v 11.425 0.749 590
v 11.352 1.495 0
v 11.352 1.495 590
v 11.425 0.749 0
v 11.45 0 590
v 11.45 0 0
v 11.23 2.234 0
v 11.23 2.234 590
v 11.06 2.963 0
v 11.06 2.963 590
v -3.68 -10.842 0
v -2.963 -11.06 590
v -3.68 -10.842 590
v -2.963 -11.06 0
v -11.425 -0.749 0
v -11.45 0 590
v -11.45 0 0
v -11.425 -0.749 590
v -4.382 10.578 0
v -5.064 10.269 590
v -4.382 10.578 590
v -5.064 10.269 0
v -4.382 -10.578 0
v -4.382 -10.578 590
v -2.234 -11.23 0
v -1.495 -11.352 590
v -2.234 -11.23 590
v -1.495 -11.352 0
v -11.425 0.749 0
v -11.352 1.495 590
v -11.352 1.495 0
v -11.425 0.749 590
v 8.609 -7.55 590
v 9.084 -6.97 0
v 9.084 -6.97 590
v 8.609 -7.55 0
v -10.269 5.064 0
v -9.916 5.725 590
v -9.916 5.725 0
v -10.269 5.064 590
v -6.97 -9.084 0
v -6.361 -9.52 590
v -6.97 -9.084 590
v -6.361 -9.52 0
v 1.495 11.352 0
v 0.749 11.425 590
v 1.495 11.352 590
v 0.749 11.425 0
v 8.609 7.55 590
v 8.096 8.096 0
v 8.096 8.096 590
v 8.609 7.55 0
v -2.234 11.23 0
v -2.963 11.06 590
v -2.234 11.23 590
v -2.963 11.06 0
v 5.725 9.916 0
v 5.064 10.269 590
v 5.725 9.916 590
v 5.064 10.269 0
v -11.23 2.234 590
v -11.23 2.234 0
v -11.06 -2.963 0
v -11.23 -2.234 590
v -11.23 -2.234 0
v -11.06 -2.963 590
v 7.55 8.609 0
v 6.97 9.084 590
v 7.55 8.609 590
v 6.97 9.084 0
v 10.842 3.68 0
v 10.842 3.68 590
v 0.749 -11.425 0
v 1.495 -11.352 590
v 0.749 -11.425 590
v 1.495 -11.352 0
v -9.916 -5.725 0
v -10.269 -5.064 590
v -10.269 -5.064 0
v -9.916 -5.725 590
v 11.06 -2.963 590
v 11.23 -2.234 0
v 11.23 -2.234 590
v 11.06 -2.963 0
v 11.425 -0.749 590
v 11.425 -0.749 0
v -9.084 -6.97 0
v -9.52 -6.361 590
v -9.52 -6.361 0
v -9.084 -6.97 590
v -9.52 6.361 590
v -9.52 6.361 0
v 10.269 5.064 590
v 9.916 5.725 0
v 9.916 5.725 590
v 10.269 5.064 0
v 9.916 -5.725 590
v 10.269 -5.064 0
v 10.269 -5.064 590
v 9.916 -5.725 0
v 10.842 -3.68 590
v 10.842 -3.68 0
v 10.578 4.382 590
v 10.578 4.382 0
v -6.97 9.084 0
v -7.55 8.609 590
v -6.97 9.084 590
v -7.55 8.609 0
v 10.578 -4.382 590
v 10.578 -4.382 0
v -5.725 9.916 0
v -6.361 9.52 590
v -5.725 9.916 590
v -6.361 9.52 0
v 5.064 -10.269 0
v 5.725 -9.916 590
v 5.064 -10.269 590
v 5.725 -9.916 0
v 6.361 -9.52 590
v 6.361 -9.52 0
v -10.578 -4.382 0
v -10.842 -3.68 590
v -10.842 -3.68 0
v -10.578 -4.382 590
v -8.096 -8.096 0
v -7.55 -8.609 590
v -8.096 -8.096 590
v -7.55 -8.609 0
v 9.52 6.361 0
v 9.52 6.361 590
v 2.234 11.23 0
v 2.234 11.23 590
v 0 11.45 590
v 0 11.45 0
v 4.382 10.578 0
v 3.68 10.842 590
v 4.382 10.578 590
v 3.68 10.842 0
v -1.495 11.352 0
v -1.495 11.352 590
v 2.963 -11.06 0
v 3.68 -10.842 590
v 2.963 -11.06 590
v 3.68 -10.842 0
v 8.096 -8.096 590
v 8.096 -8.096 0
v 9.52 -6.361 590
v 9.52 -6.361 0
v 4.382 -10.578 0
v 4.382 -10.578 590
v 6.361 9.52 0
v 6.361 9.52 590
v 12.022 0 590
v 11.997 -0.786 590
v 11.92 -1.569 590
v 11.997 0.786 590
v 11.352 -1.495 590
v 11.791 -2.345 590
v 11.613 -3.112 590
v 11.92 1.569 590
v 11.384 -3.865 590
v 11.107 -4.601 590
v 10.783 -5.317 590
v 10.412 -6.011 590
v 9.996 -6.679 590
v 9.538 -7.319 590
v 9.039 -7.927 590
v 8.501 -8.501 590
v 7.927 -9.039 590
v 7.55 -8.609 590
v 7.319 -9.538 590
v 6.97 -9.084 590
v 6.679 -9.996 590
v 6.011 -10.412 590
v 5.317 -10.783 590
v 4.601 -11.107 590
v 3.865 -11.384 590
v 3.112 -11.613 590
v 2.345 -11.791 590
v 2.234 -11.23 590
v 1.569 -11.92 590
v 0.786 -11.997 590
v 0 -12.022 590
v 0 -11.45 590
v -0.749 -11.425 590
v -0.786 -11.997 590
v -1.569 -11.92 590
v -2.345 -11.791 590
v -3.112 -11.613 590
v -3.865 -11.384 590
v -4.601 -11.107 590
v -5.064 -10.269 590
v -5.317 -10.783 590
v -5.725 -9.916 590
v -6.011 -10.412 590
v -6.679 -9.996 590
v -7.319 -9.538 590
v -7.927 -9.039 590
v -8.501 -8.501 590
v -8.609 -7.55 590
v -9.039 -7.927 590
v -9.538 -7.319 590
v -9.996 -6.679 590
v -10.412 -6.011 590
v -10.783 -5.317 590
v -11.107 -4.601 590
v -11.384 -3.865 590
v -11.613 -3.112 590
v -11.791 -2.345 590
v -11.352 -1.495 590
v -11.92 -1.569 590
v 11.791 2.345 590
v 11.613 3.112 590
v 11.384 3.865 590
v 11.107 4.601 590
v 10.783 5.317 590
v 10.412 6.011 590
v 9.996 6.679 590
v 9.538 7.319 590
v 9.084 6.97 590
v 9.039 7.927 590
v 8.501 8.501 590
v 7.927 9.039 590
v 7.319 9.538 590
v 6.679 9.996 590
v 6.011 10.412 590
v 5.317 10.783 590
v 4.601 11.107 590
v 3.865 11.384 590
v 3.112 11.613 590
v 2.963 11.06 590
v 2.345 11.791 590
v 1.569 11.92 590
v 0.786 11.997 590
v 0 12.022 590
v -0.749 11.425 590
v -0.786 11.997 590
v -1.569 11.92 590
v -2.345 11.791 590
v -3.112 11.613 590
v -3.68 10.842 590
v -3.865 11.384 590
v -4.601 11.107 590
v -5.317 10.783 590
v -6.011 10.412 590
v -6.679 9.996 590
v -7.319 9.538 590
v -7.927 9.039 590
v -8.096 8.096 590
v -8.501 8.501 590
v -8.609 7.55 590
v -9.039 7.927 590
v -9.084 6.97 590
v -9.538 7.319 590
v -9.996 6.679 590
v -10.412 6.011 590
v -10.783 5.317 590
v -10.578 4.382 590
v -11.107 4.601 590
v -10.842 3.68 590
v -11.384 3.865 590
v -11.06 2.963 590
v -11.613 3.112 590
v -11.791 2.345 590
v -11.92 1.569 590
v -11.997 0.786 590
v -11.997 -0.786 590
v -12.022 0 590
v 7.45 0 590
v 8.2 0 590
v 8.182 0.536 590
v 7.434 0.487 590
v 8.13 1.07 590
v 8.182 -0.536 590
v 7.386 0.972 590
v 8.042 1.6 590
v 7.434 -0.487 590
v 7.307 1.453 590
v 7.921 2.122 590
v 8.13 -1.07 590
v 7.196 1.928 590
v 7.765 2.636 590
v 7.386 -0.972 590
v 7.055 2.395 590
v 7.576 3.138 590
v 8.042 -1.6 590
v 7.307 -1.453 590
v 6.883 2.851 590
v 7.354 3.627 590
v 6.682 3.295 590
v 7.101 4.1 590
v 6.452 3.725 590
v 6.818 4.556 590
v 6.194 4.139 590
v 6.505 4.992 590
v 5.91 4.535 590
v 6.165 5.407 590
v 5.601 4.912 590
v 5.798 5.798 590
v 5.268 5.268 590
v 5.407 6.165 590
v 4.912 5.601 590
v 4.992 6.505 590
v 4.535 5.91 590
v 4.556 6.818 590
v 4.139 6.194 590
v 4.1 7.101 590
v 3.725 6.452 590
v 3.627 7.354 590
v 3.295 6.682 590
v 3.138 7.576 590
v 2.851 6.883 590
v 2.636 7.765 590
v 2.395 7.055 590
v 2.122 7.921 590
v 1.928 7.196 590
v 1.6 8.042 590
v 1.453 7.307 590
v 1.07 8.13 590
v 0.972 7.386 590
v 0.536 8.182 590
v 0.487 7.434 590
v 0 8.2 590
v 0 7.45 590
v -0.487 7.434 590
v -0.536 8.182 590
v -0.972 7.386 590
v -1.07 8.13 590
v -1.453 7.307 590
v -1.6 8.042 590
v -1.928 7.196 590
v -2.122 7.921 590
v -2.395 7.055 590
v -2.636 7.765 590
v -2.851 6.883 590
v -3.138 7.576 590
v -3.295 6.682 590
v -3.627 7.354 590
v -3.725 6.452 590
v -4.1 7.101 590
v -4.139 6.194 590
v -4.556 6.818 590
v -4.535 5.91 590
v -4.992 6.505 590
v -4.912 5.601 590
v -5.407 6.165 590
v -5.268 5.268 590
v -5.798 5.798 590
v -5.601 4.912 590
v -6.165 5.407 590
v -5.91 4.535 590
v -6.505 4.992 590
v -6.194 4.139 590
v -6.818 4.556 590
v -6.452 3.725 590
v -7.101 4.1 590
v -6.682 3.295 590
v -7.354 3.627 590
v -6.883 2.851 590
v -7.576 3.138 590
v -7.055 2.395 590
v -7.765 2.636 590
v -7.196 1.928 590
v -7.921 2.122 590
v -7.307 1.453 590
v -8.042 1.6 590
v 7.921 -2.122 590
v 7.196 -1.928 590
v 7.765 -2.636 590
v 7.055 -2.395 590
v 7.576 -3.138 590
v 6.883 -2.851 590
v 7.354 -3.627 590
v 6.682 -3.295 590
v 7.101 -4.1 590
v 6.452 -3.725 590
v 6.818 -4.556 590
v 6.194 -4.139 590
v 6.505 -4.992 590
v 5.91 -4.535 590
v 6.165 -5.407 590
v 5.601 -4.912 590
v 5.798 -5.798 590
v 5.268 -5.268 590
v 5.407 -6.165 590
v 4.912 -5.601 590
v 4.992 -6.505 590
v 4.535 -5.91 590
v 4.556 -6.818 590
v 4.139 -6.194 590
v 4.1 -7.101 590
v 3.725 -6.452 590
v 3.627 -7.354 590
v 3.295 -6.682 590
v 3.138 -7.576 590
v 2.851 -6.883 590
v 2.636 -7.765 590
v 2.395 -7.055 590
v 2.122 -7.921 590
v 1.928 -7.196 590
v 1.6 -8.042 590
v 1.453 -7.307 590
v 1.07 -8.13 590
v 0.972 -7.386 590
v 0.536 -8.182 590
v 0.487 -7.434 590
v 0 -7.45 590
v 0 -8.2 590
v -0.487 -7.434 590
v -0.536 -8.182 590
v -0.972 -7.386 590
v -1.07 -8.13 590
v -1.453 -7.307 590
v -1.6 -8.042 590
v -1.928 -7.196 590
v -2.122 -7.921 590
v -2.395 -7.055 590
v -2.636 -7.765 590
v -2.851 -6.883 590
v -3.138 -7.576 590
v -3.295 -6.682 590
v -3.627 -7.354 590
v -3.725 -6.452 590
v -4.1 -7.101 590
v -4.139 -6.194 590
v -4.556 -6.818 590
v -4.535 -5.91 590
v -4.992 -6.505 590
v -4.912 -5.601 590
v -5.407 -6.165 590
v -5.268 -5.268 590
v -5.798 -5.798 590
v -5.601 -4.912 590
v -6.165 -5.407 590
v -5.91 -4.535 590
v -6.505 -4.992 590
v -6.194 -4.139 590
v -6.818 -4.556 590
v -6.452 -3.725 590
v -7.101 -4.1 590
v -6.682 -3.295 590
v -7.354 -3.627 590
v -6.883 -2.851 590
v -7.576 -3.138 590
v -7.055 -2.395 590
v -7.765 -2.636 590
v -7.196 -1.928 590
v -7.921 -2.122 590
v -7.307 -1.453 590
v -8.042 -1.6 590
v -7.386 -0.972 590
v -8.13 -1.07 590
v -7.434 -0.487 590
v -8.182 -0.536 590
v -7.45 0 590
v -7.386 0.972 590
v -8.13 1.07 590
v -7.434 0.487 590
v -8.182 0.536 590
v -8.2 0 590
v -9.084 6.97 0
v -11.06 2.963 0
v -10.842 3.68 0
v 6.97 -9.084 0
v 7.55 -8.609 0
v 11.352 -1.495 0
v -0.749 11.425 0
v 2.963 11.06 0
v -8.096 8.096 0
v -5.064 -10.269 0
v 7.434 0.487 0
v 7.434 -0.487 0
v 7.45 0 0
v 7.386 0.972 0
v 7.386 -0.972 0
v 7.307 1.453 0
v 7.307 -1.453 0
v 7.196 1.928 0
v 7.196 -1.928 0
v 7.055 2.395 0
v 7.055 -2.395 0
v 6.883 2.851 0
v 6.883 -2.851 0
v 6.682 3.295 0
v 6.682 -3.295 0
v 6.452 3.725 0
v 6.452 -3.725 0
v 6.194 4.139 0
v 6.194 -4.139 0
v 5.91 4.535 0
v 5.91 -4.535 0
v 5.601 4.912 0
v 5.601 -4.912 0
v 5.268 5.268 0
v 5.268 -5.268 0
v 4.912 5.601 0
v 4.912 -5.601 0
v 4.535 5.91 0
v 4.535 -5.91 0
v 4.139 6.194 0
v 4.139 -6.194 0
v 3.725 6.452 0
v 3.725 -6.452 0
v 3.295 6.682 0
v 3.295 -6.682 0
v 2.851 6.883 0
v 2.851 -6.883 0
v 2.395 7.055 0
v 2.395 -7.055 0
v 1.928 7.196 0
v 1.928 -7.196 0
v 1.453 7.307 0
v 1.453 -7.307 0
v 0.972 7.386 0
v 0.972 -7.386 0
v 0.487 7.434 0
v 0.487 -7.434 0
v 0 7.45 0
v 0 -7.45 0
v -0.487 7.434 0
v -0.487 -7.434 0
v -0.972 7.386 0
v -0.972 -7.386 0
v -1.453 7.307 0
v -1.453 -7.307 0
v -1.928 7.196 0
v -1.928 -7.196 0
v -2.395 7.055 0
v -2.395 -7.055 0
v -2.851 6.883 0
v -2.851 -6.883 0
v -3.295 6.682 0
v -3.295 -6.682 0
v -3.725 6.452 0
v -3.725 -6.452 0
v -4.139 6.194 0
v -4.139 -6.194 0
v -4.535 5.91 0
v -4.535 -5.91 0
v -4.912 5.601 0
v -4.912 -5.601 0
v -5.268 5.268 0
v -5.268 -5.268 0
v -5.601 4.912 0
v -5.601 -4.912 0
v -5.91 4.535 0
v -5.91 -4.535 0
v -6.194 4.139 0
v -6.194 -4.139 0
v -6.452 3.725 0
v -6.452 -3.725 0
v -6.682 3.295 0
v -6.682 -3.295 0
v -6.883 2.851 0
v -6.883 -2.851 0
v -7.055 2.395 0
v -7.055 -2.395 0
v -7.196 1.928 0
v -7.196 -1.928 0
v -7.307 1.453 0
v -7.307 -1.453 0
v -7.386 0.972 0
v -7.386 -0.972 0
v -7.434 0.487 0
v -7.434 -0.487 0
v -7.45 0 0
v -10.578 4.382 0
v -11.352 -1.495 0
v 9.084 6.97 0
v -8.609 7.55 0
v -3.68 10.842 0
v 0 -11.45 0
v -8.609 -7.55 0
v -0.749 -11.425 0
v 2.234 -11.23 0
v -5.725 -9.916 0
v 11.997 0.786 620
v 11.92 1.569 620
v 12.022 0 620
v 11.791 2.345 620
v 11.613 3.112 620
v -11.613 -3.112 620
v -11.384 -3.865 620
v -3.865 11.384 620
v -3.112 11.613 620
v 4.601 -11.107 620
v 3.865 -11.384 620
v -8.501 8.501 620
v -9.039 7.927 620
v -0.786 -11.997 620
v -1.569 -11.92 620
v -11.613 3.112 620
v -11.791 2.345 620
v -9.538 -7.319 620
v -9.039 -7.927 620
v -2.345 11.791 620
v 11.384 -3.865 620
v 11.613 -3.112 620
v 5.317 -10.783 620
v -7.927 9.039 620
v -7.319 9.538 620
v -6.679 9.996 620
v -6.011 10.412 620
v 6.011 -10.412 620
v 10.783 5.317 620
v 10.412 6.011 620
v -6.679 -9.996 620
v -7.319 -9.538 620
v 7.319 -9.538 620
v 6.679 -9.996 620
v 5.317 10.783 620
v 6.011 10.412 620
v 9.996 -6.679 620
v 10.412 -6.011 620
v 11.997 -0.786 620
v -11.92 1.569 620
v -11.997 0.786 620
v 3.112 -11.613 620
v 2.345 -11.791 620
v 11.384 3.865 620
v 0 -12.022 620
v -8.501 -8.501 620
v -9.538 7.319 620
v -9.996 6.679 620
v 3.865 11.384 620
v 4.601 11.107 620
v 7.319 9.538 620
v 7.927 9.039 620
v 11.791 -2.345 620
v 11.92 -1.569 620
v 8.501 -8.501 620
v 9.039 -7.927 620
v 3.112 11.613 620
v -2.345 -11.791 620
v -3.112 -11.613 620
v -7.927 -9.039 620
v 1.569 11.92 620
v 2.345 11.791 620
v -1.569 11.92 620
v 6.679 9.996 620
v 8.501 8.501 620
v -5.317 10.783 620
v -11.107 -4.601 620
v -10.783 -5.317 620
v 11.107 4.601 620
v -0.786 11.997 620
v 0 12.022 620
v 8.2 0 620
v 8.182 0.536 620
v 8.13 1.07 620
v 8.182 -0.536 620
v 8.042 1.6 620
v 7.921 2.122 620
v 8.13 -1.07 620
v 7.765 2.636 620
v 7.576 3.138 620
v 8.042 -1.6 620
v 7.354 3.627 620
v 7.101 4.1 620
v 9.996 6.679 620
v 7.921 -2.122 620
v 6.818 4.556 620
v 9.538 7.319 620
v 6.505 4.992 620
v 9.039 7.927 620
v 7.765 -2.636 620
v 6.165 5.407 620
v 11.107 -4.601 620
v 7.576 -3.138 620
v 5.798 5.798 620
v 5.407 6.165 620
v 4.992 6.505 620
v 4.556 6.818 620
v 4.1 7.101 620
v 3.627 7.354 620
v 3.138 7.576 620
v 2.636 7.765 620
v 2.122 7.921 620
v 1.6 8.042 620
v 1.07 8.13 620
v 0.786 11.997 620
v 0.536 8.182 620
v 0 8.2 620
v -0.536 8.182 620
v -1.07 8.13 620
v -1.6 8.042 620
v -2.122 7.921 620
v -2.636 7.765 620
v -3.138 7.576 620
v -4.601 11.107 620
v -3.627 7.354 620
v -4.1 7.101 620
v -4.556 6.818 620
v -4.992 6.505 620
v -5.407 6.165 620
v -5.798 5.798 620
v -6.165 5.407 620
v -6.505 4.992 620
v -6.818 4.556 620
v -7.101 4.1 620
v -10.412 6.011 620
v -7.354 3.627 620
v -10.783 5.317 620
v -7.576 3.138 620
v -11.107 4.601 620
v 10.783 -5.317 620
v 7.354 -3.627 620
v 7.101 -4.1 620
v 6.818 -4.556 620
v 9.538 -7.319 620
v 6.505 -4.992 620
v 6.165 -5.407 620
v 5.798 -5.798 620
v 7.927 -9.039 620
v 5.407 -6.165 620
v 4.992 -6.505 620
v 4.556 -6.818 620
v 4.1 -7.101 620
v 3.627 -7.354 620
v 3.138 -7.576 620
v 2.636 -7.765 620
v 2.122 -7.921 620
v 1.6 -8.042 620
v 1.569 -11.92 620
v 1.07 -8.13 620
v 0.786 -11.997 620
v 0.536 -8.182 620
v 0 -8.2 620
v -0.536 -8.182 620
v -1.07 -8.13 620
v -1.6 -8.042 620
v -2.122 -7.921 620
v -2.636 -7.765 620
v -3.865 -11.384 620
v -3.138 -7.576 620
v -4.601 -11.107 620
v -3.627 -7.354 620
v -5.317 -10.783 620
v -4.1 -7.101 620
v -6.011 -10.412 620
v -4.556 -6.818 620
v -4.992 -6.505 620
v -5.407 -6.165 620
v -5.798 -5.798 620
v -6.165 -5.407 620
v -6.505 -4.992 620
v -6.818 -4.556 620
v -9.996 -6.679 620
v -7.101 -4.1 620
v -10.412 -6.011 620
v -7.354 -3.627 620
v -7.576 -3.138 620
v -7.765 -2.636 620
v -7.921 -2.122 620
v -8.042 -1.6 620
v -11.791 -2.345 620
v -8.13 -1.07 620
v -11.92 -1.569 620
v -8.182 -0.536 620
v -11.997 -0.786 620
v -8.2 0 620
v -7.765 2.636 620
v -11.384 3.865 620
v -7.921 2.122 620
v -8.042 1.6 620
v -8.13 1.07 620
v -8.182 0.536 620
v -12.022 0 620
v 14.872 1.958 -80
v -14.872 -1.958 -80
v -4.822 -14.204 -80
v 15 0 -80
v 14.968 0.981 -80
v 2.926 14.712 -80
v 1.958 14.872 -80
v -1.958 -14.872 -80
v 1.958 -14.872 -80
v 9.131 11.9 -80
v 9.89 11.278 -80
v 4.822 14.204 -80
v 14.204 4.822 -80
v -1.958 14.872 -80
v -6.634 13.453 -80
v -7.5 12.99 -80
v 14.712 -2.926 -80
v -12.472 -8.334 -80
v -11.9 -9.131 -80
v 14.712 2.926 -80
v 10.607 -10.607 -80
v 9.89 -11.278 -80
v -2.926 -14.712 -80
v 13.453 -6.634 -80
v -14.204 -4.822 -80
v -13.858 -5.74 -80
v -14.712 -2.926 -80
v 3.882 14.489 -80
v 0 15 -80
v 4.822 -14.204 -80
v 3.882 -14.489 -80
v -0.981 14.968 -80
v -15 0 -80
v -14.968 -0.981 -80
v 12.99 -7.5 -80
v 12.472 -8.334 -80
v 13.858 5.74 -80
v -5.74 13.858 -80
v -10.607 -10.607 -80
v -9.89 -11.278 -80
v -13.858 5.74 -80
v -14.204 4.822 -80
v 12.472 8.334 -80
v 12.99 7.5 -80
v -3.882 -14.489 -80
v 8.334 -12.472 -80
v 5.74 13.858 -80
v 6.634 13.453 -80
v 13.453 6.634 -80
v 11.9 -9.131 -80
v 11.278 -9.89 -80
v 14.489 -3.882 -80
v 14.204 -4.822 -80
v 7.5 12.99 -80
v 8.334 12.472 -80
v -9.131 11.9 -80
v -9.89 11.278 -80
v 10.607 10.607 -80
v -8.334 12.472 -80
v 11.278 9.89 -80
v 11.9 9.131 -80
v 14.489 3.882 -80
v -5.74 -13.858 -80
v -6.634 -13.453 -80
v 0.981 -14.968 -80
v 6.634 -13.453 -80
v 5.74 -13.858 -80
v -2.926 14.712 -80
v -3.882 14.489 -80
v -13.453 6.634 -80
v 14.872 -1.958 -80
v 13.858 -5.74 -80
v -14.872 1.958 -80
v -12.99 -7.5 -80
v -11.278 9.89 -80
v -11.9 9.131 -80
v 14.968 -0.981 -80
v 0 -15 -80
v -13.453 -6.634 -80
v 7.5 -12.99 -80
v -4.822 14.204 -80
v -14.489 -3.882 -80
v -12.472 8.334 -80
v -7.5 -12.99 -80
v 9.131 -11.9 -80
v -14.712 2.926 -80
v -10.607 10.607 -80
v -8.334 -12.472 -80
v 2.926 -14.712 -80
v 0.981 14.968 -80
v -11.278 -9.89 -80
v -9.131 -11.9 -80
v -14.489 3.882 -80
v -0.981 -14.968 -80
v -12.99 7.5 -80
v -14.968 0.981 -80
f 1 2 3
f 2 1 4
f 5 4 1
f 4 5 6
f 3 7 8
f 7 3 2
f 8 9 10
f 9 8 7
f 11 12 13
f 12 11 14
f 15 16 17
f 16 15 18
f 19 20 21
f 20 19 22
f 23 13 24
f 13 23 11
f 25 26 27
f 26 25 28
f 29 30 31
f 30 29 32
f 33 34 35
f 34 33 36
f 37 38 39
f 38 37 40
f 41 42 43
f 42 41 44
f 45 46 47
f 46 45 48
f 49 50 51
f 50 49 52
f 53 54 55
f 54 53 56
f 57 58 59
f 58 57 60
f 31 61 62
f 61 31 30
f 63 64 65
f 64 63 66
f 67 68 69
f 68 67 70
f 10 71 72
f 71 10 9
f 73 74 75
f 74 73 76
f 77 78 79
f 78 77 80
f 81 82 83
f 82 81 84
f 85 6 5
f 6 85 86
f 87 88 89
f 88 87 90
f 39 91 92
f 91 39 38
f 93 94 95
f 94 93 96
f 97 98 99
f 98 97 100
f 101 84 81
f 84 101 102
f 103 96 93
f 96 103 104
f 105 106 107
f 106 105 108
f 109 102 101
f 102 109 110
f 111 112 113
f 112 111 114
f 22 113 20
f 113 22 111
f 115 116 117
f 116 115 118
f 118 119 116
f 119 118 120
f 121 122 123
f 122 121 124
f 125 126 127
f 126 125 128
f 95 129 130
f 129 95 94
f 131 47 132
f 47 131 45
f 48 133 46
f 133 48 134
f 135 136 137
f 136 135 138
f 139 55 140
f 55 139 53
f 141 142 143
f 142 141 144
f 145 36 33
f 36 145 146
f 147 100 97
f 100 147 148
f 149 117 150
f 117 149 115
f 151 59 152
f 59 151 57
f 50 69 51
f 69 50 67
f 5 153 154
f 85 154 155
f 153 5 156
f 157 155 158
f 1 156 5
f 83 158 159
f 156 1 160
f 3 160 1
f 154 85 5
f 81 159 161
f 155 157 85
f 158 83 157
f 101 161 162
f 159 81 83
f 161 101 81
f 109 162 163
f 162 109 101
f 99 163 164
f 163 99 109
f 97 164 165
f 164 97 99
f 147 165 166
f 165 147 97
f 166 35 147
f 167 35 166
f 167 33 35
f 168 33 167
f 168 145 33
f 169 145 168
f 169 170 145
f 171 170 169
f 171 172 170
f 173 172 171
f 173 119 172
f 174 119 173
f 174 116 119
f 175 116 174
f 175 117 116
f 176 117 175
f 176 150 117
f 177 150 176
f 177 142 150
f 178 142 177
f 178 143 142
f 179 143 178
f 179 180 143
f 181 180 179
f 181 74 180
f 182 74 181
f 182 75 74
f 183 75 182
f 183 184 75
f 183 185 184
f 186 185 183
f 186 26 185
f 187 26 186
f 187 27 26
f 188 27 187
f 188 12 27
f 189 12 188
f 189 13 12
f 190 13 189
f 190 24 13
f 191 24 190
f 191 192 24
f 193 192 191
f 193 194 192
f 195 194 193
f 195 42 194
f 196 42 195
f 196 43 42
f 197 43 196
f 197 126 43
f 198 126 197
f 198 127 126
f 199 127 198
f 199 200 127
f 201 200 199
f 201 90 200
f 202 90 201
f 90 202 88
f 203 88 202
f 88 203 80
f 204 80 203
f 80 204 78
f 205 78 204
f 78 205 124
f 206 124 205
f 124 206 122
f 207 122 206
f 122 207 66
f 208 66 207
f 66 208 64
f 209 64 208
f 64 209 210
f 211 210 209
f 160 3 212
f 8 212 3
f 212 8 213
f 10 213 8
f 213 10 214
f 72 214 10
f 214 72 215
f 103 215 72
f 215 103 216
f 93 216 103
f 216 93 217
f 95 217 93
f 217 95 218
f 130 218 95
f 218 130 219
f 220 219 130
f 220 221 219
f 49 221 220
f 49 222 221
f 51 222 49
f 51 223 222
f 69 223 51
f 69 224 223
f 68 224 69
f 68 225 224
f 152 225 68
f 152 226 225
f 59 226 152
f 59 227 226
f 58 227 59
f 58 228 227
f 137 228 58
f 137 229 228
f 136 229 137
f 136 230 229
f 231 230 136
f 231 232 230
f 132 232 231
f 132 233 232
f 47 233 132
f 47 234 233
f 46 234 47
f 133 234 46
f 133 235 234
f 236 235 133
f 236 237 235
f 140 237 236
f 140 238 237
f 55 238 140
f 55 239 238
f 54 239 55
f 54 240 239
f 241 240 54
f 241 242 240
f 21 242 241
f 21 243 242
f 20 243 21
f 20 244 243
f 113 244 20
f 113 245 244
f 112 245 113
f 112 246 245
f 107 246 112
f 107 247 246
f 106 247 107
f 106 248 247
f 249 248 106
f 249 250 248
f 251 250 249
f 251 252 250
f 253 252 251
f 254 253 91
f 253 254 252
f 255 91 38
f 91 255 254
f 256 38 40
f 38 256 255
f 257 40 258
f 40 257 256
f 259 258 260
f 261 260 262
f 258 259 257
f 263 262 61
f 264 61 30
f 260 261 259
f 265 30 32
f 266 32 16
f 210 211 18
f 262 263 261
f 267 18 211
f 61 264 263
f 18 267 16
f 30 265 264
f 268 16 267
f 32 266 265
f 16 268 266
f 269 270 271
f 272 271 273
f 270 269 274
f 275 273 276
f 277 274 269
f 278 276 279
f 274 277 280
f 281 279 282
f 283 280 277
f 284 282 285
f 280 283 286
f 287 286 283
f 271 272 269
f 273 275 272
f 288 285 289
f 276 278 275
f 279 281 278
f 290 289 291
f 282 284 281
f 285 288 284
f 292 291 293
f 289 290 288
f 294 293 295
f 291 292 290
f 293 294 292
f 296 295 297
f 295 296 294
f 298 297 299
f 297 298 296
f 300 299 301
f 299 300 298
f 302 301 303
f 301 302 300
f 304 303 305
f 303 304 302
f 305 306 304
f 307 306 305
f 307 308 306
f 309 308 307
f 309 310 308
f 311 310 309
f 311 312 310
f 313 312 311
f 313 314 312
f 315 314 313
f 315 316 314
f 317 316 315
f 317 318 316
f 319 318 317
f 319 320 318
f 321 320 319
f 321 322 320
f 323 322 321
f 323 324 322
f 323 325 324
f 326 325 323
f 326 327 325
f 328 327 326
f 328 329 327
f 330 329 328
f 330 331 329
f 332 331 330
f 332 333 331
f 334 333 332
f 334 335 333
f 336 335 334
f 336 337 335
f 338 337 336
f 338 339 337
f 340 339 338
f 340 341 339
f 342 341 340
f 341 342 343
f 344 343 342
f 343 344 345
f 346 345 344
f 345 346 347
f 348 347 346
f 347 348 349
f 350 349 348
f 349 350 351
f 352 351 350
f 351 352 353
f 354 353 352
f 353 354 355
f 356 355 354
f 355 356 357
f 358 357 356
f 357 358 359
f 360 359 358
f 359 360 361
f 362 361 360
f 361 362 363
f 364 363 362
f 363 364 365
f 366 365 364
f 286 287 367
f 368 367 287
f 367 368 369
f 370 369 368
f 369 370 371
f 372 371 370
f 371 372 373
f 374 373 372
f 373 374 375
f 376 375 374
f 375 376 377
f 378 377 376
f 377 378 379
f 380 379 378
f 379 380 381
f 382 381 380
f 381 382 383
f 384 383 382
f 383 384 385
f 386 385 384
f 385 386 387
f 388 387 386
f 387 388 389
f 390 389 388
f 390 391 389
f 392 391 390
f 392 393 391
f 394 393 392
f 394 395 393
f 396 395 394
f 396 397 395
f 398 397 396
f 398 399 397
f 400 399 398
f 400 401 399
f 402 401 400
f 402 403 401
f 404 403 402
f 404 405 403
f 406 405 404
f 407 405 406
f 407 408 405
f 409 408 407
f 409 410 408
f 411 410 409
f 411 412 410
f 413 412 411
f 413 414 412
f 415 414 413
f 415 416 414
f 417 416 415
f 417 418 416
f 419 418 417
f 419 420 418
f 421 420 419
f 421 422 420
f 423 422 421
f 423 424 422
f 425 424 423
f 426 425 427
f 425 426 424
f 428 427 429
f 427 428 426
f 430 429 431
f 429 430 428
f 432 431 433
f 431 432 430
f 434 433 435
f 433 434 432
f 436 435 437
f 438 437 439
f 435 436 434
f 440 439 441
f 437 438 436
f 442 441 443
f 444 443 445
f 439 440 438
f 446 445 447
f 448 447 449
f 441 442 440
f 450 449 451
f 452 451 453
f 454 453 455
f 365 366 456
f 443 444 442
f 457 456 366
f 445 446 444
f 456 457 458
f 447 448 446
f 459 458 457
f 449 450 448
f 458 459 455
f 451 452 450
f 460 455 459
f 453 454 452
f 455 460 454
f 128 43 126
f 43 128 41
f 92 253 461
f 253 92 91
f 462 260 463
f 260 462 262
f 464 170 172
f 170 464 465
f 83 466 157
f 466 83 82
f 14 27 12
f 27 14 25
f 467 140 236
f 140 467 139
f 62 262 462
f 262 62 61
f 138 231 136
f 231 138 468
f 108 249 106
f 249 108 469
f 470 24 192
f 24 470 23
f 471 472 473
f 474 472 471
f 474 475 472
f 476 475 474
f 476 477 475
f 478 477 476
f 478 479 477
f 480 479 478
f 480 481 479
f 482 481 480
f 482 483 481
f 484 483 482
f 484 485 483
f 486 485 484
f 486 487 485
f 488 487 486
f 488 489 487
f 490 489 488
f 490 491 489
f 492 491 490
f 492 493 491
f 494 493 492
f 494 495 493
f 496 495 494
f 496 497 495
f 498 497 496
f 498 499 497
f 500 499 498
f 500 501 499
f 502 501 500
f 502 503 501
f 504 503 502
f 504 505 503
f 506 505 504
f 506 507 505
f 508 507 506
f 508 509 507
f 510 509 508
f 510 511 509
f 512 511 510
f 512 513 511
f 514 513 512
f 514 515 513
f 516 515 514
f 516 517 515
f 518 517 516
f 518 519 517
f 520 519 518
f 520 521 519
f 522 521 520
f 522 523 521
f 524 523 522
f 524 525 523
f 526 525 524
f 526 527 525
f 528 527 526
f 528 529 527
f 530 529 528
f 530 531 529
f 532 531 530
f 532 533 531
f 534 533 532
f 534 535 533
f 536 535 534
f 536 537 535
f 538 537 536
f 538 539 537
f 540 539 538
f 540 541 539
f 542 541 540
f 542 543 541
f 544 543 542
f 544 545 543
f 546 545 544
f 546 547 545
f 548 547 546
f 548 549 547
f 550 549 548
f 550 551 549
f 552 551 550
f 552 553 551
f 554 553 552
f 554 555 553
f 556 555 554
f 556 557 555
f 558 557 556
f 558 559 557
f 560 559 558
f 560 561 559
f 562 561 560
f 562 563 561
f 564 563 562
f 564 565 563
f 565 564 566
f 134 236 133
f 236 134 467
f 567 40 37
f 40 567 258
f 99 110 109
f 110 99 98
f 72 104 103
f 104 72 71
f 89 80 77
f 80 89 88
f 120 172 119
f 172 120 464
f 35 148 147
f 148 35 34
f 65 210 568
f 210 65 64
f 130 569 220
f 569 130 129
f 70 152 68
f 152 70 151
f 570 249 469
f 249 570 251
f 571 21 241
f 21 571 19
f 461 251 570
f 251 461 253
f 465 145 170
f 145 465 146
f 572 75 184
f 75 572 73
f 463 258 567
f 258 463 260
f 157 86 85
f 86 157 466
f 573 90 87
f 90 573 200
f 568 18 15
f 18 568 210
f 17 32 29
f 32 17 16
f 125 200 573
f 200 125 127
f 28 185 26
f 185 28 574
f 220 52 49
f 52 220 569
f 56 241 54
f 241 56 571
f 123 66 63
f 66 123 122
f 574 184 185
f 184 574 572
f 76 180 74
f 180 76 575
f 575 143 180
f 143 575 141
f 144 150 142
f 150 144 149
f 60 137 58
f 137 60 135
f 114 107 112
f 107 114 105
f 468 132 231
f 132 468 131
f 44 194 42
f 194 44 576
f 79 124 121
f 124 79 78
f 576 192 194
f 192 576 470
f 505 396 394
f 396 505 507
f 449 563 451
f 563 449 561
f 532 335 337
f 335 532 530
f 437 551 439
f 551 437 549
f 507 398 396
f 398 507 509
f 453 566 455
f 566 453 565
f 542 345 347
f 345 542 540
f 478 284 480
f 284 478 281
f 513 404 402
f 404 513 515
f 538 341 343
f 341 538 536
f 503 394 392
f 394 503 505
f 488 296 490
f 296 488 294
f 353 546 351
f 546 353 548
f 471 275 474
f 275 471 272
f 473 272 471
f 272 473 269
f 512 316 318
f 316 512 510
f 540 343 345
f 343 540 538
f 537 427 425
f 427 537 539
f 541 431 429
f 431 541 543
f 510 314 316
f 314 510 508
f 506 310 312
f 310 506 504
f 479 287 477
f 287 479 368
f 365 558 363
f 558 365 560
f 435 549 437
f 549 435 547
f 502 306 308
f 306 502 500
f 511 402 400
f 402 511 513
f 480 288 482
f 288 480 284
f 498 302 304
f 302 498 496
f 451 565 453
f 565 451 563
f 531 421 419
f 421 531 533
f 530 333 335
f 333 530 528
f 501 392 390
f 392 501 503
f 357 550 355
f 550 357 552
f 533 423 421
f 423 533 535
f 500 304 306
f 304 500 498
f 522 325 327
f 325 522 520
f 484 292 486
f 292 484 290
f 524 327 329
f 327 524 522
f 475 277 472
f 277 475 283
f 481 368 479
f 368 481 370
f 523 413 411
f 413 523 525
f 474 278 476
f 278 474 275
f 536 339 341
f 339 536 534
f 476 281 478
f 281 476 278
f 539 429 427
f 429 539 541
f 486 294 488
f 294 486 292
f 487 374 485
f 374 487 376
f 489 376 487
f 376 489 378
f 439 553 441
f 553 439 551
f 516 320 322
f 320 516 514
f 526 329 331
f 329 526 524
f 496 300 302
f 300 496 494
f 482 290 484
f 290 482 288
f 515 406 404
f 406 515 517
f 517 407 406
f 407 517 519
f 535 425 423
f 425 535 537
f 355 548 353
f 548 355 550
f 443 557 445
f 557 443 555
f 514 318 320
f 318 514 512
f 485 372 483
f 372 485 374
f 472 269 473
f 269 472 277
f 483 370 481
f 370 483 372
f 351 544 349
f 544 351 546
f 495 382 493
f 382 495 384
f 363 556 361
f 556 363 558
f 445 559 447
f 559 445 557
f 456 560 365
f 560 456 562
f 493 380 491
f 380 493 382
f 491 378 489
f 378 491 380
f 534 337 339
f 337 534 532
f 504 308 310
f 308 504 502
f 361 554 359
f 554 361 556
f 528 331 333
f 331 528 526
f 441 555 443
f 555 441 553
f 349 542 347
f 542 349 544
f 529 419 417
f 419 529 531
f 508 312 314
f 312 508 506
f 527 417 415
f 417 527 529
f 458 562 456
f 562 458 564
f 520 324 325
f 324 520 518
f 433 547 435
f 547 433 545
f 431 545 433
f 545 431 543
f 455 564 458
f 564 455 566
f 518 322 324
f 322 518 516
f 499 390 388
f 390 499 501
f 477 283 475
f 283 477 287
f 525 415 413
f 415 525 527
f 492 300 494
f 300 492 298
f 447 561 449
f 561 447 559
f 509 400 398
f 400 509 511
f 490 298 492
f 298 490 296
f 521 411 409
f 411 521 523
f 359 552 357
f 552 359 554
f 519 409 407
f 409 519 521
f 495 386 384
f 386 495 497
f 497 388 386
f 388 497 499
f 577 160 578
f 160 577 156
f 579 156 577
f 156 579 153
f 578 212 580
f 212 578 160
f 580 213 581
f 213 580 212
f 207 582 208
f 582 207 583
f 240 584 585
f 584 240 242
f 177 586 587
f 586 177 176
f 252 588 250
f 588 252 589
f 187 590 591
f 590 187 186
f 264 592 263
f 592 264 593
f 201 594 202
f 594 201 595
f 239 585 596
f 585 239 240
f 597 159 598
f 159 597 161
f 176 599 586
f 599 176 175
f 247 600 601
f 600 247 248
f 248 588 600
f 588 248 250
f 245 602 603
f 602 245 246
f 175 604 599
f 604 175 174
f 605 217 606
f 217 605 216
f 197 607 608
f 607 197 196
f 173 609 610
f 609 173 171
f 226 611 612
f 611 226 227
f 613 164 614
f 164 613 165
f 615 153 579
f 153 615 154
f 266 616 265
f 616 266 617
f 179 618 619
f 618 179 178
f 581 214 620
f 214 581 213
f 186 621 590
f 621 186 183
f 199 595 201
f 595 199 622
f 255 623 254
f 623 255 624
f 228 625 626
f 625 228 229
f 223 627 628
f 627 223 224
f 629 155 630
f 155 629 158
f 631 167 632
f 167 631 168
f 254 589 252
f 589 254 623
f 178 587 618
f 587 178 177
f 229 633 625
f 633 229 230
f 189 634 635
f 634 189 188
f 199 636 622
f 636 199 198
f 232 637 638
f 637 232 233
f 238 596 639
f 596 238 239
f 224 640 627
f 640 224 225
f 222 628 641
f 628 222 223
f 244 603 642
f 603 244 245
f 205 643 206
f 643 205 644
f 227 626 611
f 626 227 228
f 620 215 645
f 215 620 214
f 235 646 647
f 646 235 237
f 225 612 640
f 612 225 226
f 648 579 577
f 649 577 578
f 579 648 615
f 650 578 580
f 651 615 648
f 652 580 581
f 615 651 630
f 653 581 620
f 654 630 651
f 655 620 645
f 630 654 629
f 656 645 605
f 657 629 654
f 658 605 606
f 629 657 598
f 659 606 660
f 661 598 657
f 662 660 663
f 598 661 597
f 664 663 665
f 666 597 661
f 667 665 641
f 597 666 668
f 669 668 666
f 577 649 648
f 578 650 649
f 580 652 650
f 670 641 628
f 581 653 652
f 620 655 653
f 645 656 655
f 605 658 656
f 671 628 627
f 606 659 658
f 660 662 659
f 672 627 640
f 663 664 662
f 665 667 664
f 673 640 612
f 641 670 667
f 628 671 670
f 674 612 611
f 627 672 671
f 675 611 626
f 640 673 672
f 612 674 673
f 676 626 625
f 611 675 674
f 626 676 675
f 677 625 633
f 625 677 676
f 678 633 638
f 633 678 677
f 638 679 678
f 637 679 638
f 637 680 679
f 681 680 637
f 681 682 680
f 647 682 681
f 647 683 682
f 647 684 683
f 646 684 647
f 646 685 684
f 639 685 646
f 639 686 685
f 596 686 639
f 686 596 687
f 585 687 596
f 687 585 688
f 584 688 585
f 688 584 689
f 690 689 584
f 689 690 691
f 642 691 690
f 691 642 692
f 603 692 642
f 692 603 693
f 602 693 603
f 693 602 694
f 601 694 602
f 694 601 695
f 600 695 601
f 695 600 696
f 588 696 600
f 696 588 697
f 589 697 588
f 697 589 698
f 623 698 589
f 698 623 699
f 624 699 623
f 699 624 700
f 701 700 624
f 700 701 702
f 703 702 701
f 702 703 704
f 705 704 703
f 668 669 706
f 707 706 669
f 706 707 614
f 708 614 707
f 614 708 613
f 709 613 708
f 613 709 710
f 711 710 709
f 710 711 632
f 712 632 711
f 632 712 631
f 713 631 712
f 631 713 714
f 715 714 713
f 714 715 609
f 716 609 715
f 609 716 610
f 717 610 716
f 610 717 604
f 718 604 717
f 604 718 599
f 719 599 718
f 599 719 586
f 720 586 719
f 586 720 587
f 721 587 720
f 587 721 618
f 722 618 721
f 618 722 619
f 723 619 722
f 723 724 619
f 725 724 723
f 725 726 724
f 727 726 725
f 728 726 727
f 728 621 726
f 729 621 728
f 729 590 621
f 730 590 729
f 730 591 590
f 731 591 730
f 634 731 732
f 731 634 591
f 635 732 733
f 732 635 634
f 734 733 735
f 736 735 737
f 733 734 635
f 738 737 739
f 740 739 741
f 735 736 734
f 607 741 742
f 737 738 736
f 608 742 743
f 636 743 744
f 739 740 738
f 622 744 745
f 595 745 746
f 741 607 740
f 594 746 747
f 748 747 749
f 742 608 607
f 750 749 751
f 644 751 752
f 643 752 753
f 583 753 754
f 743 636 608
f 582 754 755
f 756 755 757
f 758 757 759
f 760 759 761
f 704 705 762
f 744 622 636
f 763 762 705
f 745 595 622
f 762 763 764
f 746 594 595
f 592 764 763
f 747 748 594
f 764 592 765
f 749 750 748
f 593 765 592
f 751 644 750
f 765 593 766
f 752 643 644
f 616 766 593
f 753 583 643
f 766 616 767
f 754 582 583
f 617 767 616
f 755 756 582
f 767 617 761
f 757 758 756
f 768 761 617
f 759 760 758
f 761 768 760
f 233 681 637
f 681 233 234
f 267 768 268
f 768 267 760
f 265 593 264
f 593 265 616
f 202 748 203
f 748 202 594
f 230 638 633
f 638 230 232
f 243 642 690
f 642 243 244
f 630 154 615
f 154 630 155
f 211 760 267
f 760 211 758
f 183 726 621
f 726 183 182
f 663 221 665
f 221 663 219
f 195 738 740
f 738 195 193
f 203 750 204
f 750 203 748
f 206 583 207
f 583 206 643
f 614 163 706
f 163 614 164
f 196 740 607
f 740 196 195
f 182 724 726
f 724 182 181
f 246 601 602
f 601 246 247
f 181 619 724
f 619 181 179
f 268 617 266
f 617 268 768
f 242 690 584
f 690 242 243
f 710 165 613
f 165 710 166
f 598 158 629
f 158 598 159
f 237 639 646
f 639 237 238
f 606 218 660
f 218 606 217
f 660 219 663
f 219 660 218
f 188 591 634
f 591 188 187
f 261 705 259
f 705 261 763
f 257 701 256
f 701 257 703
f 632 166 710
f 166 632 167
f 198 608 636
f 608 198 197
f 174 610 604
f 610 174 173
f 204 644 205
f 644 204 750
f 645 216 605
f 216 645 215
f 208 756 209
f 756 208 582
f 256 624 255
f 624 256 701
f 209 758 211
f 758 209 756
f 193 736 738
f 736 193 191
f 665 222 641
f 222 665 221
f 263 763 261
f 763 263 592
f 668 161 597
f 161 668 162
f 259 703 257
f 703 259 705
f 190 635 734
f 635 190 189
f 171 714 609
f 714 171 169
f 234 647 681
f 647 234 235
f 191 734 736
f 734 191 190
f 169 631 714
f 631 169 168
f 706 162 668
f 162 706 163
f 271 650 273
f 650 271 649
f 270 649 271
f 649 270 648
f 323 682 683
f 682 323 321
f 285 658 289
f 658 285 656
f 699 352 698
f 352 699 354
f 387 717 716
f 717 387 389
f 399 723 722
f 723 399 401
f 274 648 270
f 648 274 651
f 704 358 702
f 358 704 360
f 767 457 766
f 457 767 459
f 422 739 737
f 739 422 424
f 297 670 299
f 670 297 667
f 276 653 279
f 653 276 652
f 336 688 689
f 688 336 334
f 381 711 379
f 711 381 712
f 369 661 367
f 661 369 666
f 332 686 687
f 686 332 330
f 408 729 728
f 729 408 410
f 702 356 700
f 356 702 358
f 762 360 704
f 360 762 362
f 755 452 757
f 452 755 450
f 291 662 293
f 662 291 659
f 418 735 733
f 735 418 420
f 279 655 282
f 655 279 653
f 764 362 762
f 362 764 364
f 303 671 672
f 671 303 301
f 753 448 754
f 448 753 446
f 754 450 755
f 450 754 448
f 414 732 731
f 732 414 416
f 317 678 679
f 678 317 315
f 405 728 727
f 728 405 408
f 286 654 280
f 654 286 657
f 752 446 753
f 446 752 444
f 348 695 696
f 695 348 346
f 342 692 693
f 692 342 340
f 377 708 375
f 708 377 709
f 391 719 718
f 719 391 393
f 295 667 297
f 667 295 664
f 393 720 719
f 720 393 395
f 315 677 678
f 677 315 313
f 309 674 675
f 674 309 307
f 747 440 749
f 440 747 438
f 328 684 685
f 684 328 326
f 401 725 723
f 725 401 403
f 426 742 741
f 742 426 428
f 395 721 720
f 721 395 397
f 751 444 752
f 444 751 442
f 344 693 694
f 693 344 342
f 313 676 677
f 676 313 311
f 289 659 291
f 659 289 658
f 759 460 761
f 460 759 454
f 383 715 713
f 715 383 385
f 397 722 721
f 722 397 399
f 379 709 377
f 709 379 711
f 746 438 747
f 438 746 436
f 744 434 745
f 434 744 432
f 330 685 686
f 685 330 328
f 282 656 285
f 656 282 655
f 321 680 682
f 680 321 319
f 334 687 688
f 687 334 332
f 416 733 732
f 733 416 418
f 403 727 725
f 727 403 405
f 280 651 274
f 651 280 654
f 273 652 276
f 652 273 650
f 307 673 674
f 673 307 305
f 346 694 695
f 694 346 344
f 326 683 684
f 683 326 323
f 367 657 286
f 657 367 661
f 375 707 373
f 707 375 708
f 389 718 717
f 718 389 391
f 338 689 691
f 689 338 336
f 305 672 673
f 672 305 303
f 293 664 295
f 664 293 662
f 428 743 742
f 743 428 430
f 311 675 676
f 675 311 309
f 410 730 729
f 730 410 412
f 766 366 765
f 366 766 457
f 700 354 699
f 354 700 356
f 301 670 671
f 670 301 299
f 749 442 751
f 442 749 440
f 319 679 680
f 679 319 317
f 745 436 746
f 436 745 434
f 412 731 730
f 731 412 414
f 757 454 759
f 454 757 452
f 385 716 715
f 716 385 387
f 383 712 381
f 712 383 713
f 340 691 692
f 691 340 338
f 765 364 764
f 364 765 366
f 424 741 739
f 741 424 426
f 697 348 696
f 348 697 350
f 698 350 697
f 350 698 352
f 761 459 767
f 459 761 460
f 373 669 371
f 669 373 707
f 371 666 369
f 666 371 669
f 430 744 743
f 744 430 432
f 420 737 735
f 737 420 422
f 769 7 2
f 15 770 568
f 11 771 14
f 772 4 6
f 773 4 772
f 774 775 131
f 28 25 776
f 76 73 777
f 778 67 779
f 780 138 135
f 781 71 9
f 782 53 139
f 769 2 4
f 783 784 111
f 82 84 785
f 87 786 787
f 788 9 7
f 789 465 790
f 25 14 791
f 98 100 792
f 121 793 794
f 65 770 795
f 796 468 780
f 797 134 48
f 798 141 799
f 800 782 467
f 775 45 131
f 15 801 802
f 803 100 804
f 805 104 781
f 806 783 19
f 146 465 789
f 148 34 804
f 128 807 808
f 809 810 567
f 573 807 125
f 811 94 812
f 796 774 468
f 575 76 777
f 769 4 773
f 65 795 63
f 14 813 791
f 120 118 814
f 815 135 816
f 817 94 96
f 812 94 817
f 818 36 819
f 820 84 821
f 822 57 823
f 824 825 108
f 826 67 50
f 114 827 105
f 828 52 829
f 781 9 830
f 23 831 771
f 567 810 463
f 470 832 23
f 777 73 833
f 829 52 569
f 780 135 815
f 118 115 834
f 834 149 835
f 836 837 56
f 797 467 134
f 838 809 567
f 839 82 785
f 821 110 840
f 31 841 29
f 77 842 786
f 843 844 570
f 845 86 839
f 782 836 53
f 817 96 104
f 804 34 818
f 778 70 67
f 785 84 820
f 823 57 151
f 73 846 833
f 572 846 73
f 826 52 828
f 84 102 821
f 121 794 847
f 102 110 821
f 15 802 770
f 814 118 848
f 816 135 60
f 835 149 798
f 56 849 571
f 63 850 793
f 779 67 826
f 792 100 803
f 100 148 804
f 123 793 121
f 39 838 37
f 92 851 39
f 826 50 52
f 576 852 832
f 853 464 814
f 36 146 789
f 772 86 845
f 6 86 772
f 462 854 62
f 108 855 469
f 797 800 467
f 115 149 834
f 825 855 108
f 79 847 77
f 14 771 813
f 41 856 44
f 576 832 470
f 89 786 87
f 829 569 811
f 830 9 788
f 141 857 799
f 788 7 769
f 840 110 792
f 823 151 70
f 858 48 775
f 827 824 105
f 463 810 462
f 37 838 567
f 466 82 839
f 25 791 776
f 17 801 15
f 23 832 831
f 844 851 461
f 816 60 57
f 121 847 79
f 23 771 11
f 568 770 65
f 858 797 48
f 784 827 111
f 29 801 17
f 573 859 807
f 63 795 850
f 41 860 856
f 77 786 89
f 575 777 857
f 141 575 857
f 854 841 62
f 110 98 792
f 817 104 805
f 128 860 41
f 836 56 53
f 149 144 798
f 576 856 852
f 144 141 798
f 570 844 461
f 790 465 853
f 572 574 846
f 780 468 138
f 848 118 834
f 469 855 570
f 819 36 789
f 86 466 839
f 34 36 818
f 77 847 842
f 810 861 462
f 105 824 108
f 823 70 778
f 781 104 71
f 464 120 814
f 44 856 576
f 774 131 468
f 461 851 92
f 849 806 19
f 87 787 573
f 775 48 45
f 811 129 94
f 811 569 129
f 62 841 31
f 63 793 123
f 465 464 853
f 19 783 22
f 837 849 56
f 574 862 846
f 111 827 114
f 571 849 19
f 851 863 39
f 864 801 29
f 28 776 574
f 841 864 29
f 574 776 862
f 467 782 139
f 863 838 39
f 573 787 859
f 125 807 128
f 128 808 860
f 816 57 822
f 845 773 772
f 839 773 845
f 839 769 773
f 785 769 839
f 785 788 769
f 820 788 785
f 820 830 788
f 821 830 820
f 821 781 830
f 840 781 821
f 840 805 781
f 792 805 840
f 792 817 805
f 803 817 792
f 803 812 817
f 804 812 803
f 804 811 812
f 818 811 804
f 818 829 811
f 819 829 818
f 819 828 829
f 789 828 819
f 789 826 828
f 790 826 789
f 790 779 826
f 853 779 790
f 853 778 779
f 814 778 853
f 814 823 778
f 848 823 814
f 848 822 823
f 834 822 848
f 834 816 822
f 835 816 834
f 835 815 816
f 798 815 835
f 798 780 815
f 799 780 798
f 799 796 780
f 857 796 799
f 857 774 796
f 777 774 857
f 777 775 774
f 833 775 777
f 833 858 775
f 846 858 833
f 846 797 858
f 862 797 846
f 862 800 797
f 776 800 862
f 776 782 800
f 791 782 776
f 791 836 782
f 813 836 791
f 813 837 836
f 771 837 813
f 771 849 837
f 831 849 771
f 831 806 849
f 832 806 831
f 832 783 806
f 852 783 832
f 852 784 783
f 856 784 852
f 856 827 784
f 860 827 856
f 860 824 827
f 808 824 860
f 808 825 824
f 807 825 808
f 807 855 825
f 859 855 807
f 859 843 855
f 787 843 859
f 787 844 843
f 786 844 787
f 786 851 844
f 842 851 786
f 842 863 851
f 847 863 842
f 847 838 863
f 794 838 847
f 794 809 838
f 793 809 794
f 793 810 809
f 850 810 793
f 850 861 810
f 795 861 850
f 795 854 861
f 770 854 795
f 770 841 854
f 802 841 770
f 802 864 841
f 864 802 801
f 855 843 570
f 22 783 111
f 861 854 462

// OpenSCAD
// Clarinet V5 starter scaffold — OpenSCAD parametric model.
// Starter scaffold only: dimensions are measurement-required placeholders.
// NOT build-ready CAD. Do not use for drilling, turning, or fixture work.
// Authority source: family-spec.csv CLN-V5-STUDY-001 (measurement_required).

// See cad/mcp-session-log.md for V5 provenance.
// See cad-dxf-authority-plan.md and cad-dxf-authority-gates.csv before
// treating any dimension here as fabrication authority.

$fn = 96;

// ── Parameters (all measurement-required until bore-station-plan.csv filled) ──
// Source: family-spec.csv CLN-V5-STUDY-001 — acoustic-law seed values only.
// Replace with measured bore station data before any CAD authority claim.

bore_id_mm          = 14.9;   // starter estimate — measurement required
wall_thickness_mm   = 4.0;    // starter estimate — measurement required
body_length_mm      = 590.0;  // acoustic seed (closed-open A3 first-approx) — measurement required
bell_length_mm      = 80.0;   // starter placeholder — measurement required
bell_flare_mm       = 30.0;   // exit diameter starter — measurement required

mouthpiece_socket_depth_mm = 30.0;   // reed/mouthpiece fit — measurement required
mouthpiece_socket_id_mm    = bore_id_mm + 1.5; // slight clearance — measurement required

// Tone hole placeholders (positions from Boehm layout seed, not measured authority).
// Do not drill from these values. Replace with tone-hole-authority-plan.csv data.
tone_hole_dia_mm = 10.5;  // starter — measurement required

// Approximate Boehm-system tone hole centres from bell end (seed values only).
tone_hole_z = [
  85,   // Hole 1 (LH 1)
  130,  // Hole 2 (LH 2)
  175,  // Hole 3 (LH 3)
  225,  // Hole 4 (RH 1)
  270,  // Hole 5 (RH 2)
  315,  // Hole 6 (RH 3)
  380   // Register hole (thumb, top)
];

outer_dia_mm = bore_id_mm + 2 * wall_thickness_mm;

// ── Modules ──────────────────────────────────────────────────────────────────

module bore_body() {
  difference() {
    cylinder(h = body_length_mm, d = outer_dia_mm);
    translate([0, 0, -1])
      cylinder(h = body_length_mm + 2, d = bore_id_mm);
  }
}

module mouthpiece_socket() {
  // Simplified socket stub — does not model barrel, ligature, or reed geometry.
  translate([0, 0, body_length_mm])
    difference() {
      cylinder(h = mouthpiece_socket_depth_mm, d = outer_dia_mm * 1.05);
      translate([0, 0, -1])
        cylinder(h = mouthpiece_socket_depth_mm + 2, d = mouthpiece_socket_id_mm);
    }
}

module bell_flare() {
  // Simplified straight-taper bell stub.
  translate([0, 0, -bell_length_mm])
    cylinder(h = bell_length_mm, d1 = bell_flare_mm, d2 = outer_dia_mm);
}

module tone_hole_stub(z_pos) {
  translate([0, -outer_dia_mm / 2, z_pos])
    rotate([90, 0, 0])
      cylinder(h = outer_dia_mm + 2, d = tone_hole_dia_mm);
}

// ── Assembly ─────────────────────────────────────────────────────────────────

union() {
  bore_body();
  mouthpiece_socket();
  bell_flare();
}
// Subtract tone holes from the body for visual reference only.
// (Uses a difference/intersection approach for full geometry if needed later.)
